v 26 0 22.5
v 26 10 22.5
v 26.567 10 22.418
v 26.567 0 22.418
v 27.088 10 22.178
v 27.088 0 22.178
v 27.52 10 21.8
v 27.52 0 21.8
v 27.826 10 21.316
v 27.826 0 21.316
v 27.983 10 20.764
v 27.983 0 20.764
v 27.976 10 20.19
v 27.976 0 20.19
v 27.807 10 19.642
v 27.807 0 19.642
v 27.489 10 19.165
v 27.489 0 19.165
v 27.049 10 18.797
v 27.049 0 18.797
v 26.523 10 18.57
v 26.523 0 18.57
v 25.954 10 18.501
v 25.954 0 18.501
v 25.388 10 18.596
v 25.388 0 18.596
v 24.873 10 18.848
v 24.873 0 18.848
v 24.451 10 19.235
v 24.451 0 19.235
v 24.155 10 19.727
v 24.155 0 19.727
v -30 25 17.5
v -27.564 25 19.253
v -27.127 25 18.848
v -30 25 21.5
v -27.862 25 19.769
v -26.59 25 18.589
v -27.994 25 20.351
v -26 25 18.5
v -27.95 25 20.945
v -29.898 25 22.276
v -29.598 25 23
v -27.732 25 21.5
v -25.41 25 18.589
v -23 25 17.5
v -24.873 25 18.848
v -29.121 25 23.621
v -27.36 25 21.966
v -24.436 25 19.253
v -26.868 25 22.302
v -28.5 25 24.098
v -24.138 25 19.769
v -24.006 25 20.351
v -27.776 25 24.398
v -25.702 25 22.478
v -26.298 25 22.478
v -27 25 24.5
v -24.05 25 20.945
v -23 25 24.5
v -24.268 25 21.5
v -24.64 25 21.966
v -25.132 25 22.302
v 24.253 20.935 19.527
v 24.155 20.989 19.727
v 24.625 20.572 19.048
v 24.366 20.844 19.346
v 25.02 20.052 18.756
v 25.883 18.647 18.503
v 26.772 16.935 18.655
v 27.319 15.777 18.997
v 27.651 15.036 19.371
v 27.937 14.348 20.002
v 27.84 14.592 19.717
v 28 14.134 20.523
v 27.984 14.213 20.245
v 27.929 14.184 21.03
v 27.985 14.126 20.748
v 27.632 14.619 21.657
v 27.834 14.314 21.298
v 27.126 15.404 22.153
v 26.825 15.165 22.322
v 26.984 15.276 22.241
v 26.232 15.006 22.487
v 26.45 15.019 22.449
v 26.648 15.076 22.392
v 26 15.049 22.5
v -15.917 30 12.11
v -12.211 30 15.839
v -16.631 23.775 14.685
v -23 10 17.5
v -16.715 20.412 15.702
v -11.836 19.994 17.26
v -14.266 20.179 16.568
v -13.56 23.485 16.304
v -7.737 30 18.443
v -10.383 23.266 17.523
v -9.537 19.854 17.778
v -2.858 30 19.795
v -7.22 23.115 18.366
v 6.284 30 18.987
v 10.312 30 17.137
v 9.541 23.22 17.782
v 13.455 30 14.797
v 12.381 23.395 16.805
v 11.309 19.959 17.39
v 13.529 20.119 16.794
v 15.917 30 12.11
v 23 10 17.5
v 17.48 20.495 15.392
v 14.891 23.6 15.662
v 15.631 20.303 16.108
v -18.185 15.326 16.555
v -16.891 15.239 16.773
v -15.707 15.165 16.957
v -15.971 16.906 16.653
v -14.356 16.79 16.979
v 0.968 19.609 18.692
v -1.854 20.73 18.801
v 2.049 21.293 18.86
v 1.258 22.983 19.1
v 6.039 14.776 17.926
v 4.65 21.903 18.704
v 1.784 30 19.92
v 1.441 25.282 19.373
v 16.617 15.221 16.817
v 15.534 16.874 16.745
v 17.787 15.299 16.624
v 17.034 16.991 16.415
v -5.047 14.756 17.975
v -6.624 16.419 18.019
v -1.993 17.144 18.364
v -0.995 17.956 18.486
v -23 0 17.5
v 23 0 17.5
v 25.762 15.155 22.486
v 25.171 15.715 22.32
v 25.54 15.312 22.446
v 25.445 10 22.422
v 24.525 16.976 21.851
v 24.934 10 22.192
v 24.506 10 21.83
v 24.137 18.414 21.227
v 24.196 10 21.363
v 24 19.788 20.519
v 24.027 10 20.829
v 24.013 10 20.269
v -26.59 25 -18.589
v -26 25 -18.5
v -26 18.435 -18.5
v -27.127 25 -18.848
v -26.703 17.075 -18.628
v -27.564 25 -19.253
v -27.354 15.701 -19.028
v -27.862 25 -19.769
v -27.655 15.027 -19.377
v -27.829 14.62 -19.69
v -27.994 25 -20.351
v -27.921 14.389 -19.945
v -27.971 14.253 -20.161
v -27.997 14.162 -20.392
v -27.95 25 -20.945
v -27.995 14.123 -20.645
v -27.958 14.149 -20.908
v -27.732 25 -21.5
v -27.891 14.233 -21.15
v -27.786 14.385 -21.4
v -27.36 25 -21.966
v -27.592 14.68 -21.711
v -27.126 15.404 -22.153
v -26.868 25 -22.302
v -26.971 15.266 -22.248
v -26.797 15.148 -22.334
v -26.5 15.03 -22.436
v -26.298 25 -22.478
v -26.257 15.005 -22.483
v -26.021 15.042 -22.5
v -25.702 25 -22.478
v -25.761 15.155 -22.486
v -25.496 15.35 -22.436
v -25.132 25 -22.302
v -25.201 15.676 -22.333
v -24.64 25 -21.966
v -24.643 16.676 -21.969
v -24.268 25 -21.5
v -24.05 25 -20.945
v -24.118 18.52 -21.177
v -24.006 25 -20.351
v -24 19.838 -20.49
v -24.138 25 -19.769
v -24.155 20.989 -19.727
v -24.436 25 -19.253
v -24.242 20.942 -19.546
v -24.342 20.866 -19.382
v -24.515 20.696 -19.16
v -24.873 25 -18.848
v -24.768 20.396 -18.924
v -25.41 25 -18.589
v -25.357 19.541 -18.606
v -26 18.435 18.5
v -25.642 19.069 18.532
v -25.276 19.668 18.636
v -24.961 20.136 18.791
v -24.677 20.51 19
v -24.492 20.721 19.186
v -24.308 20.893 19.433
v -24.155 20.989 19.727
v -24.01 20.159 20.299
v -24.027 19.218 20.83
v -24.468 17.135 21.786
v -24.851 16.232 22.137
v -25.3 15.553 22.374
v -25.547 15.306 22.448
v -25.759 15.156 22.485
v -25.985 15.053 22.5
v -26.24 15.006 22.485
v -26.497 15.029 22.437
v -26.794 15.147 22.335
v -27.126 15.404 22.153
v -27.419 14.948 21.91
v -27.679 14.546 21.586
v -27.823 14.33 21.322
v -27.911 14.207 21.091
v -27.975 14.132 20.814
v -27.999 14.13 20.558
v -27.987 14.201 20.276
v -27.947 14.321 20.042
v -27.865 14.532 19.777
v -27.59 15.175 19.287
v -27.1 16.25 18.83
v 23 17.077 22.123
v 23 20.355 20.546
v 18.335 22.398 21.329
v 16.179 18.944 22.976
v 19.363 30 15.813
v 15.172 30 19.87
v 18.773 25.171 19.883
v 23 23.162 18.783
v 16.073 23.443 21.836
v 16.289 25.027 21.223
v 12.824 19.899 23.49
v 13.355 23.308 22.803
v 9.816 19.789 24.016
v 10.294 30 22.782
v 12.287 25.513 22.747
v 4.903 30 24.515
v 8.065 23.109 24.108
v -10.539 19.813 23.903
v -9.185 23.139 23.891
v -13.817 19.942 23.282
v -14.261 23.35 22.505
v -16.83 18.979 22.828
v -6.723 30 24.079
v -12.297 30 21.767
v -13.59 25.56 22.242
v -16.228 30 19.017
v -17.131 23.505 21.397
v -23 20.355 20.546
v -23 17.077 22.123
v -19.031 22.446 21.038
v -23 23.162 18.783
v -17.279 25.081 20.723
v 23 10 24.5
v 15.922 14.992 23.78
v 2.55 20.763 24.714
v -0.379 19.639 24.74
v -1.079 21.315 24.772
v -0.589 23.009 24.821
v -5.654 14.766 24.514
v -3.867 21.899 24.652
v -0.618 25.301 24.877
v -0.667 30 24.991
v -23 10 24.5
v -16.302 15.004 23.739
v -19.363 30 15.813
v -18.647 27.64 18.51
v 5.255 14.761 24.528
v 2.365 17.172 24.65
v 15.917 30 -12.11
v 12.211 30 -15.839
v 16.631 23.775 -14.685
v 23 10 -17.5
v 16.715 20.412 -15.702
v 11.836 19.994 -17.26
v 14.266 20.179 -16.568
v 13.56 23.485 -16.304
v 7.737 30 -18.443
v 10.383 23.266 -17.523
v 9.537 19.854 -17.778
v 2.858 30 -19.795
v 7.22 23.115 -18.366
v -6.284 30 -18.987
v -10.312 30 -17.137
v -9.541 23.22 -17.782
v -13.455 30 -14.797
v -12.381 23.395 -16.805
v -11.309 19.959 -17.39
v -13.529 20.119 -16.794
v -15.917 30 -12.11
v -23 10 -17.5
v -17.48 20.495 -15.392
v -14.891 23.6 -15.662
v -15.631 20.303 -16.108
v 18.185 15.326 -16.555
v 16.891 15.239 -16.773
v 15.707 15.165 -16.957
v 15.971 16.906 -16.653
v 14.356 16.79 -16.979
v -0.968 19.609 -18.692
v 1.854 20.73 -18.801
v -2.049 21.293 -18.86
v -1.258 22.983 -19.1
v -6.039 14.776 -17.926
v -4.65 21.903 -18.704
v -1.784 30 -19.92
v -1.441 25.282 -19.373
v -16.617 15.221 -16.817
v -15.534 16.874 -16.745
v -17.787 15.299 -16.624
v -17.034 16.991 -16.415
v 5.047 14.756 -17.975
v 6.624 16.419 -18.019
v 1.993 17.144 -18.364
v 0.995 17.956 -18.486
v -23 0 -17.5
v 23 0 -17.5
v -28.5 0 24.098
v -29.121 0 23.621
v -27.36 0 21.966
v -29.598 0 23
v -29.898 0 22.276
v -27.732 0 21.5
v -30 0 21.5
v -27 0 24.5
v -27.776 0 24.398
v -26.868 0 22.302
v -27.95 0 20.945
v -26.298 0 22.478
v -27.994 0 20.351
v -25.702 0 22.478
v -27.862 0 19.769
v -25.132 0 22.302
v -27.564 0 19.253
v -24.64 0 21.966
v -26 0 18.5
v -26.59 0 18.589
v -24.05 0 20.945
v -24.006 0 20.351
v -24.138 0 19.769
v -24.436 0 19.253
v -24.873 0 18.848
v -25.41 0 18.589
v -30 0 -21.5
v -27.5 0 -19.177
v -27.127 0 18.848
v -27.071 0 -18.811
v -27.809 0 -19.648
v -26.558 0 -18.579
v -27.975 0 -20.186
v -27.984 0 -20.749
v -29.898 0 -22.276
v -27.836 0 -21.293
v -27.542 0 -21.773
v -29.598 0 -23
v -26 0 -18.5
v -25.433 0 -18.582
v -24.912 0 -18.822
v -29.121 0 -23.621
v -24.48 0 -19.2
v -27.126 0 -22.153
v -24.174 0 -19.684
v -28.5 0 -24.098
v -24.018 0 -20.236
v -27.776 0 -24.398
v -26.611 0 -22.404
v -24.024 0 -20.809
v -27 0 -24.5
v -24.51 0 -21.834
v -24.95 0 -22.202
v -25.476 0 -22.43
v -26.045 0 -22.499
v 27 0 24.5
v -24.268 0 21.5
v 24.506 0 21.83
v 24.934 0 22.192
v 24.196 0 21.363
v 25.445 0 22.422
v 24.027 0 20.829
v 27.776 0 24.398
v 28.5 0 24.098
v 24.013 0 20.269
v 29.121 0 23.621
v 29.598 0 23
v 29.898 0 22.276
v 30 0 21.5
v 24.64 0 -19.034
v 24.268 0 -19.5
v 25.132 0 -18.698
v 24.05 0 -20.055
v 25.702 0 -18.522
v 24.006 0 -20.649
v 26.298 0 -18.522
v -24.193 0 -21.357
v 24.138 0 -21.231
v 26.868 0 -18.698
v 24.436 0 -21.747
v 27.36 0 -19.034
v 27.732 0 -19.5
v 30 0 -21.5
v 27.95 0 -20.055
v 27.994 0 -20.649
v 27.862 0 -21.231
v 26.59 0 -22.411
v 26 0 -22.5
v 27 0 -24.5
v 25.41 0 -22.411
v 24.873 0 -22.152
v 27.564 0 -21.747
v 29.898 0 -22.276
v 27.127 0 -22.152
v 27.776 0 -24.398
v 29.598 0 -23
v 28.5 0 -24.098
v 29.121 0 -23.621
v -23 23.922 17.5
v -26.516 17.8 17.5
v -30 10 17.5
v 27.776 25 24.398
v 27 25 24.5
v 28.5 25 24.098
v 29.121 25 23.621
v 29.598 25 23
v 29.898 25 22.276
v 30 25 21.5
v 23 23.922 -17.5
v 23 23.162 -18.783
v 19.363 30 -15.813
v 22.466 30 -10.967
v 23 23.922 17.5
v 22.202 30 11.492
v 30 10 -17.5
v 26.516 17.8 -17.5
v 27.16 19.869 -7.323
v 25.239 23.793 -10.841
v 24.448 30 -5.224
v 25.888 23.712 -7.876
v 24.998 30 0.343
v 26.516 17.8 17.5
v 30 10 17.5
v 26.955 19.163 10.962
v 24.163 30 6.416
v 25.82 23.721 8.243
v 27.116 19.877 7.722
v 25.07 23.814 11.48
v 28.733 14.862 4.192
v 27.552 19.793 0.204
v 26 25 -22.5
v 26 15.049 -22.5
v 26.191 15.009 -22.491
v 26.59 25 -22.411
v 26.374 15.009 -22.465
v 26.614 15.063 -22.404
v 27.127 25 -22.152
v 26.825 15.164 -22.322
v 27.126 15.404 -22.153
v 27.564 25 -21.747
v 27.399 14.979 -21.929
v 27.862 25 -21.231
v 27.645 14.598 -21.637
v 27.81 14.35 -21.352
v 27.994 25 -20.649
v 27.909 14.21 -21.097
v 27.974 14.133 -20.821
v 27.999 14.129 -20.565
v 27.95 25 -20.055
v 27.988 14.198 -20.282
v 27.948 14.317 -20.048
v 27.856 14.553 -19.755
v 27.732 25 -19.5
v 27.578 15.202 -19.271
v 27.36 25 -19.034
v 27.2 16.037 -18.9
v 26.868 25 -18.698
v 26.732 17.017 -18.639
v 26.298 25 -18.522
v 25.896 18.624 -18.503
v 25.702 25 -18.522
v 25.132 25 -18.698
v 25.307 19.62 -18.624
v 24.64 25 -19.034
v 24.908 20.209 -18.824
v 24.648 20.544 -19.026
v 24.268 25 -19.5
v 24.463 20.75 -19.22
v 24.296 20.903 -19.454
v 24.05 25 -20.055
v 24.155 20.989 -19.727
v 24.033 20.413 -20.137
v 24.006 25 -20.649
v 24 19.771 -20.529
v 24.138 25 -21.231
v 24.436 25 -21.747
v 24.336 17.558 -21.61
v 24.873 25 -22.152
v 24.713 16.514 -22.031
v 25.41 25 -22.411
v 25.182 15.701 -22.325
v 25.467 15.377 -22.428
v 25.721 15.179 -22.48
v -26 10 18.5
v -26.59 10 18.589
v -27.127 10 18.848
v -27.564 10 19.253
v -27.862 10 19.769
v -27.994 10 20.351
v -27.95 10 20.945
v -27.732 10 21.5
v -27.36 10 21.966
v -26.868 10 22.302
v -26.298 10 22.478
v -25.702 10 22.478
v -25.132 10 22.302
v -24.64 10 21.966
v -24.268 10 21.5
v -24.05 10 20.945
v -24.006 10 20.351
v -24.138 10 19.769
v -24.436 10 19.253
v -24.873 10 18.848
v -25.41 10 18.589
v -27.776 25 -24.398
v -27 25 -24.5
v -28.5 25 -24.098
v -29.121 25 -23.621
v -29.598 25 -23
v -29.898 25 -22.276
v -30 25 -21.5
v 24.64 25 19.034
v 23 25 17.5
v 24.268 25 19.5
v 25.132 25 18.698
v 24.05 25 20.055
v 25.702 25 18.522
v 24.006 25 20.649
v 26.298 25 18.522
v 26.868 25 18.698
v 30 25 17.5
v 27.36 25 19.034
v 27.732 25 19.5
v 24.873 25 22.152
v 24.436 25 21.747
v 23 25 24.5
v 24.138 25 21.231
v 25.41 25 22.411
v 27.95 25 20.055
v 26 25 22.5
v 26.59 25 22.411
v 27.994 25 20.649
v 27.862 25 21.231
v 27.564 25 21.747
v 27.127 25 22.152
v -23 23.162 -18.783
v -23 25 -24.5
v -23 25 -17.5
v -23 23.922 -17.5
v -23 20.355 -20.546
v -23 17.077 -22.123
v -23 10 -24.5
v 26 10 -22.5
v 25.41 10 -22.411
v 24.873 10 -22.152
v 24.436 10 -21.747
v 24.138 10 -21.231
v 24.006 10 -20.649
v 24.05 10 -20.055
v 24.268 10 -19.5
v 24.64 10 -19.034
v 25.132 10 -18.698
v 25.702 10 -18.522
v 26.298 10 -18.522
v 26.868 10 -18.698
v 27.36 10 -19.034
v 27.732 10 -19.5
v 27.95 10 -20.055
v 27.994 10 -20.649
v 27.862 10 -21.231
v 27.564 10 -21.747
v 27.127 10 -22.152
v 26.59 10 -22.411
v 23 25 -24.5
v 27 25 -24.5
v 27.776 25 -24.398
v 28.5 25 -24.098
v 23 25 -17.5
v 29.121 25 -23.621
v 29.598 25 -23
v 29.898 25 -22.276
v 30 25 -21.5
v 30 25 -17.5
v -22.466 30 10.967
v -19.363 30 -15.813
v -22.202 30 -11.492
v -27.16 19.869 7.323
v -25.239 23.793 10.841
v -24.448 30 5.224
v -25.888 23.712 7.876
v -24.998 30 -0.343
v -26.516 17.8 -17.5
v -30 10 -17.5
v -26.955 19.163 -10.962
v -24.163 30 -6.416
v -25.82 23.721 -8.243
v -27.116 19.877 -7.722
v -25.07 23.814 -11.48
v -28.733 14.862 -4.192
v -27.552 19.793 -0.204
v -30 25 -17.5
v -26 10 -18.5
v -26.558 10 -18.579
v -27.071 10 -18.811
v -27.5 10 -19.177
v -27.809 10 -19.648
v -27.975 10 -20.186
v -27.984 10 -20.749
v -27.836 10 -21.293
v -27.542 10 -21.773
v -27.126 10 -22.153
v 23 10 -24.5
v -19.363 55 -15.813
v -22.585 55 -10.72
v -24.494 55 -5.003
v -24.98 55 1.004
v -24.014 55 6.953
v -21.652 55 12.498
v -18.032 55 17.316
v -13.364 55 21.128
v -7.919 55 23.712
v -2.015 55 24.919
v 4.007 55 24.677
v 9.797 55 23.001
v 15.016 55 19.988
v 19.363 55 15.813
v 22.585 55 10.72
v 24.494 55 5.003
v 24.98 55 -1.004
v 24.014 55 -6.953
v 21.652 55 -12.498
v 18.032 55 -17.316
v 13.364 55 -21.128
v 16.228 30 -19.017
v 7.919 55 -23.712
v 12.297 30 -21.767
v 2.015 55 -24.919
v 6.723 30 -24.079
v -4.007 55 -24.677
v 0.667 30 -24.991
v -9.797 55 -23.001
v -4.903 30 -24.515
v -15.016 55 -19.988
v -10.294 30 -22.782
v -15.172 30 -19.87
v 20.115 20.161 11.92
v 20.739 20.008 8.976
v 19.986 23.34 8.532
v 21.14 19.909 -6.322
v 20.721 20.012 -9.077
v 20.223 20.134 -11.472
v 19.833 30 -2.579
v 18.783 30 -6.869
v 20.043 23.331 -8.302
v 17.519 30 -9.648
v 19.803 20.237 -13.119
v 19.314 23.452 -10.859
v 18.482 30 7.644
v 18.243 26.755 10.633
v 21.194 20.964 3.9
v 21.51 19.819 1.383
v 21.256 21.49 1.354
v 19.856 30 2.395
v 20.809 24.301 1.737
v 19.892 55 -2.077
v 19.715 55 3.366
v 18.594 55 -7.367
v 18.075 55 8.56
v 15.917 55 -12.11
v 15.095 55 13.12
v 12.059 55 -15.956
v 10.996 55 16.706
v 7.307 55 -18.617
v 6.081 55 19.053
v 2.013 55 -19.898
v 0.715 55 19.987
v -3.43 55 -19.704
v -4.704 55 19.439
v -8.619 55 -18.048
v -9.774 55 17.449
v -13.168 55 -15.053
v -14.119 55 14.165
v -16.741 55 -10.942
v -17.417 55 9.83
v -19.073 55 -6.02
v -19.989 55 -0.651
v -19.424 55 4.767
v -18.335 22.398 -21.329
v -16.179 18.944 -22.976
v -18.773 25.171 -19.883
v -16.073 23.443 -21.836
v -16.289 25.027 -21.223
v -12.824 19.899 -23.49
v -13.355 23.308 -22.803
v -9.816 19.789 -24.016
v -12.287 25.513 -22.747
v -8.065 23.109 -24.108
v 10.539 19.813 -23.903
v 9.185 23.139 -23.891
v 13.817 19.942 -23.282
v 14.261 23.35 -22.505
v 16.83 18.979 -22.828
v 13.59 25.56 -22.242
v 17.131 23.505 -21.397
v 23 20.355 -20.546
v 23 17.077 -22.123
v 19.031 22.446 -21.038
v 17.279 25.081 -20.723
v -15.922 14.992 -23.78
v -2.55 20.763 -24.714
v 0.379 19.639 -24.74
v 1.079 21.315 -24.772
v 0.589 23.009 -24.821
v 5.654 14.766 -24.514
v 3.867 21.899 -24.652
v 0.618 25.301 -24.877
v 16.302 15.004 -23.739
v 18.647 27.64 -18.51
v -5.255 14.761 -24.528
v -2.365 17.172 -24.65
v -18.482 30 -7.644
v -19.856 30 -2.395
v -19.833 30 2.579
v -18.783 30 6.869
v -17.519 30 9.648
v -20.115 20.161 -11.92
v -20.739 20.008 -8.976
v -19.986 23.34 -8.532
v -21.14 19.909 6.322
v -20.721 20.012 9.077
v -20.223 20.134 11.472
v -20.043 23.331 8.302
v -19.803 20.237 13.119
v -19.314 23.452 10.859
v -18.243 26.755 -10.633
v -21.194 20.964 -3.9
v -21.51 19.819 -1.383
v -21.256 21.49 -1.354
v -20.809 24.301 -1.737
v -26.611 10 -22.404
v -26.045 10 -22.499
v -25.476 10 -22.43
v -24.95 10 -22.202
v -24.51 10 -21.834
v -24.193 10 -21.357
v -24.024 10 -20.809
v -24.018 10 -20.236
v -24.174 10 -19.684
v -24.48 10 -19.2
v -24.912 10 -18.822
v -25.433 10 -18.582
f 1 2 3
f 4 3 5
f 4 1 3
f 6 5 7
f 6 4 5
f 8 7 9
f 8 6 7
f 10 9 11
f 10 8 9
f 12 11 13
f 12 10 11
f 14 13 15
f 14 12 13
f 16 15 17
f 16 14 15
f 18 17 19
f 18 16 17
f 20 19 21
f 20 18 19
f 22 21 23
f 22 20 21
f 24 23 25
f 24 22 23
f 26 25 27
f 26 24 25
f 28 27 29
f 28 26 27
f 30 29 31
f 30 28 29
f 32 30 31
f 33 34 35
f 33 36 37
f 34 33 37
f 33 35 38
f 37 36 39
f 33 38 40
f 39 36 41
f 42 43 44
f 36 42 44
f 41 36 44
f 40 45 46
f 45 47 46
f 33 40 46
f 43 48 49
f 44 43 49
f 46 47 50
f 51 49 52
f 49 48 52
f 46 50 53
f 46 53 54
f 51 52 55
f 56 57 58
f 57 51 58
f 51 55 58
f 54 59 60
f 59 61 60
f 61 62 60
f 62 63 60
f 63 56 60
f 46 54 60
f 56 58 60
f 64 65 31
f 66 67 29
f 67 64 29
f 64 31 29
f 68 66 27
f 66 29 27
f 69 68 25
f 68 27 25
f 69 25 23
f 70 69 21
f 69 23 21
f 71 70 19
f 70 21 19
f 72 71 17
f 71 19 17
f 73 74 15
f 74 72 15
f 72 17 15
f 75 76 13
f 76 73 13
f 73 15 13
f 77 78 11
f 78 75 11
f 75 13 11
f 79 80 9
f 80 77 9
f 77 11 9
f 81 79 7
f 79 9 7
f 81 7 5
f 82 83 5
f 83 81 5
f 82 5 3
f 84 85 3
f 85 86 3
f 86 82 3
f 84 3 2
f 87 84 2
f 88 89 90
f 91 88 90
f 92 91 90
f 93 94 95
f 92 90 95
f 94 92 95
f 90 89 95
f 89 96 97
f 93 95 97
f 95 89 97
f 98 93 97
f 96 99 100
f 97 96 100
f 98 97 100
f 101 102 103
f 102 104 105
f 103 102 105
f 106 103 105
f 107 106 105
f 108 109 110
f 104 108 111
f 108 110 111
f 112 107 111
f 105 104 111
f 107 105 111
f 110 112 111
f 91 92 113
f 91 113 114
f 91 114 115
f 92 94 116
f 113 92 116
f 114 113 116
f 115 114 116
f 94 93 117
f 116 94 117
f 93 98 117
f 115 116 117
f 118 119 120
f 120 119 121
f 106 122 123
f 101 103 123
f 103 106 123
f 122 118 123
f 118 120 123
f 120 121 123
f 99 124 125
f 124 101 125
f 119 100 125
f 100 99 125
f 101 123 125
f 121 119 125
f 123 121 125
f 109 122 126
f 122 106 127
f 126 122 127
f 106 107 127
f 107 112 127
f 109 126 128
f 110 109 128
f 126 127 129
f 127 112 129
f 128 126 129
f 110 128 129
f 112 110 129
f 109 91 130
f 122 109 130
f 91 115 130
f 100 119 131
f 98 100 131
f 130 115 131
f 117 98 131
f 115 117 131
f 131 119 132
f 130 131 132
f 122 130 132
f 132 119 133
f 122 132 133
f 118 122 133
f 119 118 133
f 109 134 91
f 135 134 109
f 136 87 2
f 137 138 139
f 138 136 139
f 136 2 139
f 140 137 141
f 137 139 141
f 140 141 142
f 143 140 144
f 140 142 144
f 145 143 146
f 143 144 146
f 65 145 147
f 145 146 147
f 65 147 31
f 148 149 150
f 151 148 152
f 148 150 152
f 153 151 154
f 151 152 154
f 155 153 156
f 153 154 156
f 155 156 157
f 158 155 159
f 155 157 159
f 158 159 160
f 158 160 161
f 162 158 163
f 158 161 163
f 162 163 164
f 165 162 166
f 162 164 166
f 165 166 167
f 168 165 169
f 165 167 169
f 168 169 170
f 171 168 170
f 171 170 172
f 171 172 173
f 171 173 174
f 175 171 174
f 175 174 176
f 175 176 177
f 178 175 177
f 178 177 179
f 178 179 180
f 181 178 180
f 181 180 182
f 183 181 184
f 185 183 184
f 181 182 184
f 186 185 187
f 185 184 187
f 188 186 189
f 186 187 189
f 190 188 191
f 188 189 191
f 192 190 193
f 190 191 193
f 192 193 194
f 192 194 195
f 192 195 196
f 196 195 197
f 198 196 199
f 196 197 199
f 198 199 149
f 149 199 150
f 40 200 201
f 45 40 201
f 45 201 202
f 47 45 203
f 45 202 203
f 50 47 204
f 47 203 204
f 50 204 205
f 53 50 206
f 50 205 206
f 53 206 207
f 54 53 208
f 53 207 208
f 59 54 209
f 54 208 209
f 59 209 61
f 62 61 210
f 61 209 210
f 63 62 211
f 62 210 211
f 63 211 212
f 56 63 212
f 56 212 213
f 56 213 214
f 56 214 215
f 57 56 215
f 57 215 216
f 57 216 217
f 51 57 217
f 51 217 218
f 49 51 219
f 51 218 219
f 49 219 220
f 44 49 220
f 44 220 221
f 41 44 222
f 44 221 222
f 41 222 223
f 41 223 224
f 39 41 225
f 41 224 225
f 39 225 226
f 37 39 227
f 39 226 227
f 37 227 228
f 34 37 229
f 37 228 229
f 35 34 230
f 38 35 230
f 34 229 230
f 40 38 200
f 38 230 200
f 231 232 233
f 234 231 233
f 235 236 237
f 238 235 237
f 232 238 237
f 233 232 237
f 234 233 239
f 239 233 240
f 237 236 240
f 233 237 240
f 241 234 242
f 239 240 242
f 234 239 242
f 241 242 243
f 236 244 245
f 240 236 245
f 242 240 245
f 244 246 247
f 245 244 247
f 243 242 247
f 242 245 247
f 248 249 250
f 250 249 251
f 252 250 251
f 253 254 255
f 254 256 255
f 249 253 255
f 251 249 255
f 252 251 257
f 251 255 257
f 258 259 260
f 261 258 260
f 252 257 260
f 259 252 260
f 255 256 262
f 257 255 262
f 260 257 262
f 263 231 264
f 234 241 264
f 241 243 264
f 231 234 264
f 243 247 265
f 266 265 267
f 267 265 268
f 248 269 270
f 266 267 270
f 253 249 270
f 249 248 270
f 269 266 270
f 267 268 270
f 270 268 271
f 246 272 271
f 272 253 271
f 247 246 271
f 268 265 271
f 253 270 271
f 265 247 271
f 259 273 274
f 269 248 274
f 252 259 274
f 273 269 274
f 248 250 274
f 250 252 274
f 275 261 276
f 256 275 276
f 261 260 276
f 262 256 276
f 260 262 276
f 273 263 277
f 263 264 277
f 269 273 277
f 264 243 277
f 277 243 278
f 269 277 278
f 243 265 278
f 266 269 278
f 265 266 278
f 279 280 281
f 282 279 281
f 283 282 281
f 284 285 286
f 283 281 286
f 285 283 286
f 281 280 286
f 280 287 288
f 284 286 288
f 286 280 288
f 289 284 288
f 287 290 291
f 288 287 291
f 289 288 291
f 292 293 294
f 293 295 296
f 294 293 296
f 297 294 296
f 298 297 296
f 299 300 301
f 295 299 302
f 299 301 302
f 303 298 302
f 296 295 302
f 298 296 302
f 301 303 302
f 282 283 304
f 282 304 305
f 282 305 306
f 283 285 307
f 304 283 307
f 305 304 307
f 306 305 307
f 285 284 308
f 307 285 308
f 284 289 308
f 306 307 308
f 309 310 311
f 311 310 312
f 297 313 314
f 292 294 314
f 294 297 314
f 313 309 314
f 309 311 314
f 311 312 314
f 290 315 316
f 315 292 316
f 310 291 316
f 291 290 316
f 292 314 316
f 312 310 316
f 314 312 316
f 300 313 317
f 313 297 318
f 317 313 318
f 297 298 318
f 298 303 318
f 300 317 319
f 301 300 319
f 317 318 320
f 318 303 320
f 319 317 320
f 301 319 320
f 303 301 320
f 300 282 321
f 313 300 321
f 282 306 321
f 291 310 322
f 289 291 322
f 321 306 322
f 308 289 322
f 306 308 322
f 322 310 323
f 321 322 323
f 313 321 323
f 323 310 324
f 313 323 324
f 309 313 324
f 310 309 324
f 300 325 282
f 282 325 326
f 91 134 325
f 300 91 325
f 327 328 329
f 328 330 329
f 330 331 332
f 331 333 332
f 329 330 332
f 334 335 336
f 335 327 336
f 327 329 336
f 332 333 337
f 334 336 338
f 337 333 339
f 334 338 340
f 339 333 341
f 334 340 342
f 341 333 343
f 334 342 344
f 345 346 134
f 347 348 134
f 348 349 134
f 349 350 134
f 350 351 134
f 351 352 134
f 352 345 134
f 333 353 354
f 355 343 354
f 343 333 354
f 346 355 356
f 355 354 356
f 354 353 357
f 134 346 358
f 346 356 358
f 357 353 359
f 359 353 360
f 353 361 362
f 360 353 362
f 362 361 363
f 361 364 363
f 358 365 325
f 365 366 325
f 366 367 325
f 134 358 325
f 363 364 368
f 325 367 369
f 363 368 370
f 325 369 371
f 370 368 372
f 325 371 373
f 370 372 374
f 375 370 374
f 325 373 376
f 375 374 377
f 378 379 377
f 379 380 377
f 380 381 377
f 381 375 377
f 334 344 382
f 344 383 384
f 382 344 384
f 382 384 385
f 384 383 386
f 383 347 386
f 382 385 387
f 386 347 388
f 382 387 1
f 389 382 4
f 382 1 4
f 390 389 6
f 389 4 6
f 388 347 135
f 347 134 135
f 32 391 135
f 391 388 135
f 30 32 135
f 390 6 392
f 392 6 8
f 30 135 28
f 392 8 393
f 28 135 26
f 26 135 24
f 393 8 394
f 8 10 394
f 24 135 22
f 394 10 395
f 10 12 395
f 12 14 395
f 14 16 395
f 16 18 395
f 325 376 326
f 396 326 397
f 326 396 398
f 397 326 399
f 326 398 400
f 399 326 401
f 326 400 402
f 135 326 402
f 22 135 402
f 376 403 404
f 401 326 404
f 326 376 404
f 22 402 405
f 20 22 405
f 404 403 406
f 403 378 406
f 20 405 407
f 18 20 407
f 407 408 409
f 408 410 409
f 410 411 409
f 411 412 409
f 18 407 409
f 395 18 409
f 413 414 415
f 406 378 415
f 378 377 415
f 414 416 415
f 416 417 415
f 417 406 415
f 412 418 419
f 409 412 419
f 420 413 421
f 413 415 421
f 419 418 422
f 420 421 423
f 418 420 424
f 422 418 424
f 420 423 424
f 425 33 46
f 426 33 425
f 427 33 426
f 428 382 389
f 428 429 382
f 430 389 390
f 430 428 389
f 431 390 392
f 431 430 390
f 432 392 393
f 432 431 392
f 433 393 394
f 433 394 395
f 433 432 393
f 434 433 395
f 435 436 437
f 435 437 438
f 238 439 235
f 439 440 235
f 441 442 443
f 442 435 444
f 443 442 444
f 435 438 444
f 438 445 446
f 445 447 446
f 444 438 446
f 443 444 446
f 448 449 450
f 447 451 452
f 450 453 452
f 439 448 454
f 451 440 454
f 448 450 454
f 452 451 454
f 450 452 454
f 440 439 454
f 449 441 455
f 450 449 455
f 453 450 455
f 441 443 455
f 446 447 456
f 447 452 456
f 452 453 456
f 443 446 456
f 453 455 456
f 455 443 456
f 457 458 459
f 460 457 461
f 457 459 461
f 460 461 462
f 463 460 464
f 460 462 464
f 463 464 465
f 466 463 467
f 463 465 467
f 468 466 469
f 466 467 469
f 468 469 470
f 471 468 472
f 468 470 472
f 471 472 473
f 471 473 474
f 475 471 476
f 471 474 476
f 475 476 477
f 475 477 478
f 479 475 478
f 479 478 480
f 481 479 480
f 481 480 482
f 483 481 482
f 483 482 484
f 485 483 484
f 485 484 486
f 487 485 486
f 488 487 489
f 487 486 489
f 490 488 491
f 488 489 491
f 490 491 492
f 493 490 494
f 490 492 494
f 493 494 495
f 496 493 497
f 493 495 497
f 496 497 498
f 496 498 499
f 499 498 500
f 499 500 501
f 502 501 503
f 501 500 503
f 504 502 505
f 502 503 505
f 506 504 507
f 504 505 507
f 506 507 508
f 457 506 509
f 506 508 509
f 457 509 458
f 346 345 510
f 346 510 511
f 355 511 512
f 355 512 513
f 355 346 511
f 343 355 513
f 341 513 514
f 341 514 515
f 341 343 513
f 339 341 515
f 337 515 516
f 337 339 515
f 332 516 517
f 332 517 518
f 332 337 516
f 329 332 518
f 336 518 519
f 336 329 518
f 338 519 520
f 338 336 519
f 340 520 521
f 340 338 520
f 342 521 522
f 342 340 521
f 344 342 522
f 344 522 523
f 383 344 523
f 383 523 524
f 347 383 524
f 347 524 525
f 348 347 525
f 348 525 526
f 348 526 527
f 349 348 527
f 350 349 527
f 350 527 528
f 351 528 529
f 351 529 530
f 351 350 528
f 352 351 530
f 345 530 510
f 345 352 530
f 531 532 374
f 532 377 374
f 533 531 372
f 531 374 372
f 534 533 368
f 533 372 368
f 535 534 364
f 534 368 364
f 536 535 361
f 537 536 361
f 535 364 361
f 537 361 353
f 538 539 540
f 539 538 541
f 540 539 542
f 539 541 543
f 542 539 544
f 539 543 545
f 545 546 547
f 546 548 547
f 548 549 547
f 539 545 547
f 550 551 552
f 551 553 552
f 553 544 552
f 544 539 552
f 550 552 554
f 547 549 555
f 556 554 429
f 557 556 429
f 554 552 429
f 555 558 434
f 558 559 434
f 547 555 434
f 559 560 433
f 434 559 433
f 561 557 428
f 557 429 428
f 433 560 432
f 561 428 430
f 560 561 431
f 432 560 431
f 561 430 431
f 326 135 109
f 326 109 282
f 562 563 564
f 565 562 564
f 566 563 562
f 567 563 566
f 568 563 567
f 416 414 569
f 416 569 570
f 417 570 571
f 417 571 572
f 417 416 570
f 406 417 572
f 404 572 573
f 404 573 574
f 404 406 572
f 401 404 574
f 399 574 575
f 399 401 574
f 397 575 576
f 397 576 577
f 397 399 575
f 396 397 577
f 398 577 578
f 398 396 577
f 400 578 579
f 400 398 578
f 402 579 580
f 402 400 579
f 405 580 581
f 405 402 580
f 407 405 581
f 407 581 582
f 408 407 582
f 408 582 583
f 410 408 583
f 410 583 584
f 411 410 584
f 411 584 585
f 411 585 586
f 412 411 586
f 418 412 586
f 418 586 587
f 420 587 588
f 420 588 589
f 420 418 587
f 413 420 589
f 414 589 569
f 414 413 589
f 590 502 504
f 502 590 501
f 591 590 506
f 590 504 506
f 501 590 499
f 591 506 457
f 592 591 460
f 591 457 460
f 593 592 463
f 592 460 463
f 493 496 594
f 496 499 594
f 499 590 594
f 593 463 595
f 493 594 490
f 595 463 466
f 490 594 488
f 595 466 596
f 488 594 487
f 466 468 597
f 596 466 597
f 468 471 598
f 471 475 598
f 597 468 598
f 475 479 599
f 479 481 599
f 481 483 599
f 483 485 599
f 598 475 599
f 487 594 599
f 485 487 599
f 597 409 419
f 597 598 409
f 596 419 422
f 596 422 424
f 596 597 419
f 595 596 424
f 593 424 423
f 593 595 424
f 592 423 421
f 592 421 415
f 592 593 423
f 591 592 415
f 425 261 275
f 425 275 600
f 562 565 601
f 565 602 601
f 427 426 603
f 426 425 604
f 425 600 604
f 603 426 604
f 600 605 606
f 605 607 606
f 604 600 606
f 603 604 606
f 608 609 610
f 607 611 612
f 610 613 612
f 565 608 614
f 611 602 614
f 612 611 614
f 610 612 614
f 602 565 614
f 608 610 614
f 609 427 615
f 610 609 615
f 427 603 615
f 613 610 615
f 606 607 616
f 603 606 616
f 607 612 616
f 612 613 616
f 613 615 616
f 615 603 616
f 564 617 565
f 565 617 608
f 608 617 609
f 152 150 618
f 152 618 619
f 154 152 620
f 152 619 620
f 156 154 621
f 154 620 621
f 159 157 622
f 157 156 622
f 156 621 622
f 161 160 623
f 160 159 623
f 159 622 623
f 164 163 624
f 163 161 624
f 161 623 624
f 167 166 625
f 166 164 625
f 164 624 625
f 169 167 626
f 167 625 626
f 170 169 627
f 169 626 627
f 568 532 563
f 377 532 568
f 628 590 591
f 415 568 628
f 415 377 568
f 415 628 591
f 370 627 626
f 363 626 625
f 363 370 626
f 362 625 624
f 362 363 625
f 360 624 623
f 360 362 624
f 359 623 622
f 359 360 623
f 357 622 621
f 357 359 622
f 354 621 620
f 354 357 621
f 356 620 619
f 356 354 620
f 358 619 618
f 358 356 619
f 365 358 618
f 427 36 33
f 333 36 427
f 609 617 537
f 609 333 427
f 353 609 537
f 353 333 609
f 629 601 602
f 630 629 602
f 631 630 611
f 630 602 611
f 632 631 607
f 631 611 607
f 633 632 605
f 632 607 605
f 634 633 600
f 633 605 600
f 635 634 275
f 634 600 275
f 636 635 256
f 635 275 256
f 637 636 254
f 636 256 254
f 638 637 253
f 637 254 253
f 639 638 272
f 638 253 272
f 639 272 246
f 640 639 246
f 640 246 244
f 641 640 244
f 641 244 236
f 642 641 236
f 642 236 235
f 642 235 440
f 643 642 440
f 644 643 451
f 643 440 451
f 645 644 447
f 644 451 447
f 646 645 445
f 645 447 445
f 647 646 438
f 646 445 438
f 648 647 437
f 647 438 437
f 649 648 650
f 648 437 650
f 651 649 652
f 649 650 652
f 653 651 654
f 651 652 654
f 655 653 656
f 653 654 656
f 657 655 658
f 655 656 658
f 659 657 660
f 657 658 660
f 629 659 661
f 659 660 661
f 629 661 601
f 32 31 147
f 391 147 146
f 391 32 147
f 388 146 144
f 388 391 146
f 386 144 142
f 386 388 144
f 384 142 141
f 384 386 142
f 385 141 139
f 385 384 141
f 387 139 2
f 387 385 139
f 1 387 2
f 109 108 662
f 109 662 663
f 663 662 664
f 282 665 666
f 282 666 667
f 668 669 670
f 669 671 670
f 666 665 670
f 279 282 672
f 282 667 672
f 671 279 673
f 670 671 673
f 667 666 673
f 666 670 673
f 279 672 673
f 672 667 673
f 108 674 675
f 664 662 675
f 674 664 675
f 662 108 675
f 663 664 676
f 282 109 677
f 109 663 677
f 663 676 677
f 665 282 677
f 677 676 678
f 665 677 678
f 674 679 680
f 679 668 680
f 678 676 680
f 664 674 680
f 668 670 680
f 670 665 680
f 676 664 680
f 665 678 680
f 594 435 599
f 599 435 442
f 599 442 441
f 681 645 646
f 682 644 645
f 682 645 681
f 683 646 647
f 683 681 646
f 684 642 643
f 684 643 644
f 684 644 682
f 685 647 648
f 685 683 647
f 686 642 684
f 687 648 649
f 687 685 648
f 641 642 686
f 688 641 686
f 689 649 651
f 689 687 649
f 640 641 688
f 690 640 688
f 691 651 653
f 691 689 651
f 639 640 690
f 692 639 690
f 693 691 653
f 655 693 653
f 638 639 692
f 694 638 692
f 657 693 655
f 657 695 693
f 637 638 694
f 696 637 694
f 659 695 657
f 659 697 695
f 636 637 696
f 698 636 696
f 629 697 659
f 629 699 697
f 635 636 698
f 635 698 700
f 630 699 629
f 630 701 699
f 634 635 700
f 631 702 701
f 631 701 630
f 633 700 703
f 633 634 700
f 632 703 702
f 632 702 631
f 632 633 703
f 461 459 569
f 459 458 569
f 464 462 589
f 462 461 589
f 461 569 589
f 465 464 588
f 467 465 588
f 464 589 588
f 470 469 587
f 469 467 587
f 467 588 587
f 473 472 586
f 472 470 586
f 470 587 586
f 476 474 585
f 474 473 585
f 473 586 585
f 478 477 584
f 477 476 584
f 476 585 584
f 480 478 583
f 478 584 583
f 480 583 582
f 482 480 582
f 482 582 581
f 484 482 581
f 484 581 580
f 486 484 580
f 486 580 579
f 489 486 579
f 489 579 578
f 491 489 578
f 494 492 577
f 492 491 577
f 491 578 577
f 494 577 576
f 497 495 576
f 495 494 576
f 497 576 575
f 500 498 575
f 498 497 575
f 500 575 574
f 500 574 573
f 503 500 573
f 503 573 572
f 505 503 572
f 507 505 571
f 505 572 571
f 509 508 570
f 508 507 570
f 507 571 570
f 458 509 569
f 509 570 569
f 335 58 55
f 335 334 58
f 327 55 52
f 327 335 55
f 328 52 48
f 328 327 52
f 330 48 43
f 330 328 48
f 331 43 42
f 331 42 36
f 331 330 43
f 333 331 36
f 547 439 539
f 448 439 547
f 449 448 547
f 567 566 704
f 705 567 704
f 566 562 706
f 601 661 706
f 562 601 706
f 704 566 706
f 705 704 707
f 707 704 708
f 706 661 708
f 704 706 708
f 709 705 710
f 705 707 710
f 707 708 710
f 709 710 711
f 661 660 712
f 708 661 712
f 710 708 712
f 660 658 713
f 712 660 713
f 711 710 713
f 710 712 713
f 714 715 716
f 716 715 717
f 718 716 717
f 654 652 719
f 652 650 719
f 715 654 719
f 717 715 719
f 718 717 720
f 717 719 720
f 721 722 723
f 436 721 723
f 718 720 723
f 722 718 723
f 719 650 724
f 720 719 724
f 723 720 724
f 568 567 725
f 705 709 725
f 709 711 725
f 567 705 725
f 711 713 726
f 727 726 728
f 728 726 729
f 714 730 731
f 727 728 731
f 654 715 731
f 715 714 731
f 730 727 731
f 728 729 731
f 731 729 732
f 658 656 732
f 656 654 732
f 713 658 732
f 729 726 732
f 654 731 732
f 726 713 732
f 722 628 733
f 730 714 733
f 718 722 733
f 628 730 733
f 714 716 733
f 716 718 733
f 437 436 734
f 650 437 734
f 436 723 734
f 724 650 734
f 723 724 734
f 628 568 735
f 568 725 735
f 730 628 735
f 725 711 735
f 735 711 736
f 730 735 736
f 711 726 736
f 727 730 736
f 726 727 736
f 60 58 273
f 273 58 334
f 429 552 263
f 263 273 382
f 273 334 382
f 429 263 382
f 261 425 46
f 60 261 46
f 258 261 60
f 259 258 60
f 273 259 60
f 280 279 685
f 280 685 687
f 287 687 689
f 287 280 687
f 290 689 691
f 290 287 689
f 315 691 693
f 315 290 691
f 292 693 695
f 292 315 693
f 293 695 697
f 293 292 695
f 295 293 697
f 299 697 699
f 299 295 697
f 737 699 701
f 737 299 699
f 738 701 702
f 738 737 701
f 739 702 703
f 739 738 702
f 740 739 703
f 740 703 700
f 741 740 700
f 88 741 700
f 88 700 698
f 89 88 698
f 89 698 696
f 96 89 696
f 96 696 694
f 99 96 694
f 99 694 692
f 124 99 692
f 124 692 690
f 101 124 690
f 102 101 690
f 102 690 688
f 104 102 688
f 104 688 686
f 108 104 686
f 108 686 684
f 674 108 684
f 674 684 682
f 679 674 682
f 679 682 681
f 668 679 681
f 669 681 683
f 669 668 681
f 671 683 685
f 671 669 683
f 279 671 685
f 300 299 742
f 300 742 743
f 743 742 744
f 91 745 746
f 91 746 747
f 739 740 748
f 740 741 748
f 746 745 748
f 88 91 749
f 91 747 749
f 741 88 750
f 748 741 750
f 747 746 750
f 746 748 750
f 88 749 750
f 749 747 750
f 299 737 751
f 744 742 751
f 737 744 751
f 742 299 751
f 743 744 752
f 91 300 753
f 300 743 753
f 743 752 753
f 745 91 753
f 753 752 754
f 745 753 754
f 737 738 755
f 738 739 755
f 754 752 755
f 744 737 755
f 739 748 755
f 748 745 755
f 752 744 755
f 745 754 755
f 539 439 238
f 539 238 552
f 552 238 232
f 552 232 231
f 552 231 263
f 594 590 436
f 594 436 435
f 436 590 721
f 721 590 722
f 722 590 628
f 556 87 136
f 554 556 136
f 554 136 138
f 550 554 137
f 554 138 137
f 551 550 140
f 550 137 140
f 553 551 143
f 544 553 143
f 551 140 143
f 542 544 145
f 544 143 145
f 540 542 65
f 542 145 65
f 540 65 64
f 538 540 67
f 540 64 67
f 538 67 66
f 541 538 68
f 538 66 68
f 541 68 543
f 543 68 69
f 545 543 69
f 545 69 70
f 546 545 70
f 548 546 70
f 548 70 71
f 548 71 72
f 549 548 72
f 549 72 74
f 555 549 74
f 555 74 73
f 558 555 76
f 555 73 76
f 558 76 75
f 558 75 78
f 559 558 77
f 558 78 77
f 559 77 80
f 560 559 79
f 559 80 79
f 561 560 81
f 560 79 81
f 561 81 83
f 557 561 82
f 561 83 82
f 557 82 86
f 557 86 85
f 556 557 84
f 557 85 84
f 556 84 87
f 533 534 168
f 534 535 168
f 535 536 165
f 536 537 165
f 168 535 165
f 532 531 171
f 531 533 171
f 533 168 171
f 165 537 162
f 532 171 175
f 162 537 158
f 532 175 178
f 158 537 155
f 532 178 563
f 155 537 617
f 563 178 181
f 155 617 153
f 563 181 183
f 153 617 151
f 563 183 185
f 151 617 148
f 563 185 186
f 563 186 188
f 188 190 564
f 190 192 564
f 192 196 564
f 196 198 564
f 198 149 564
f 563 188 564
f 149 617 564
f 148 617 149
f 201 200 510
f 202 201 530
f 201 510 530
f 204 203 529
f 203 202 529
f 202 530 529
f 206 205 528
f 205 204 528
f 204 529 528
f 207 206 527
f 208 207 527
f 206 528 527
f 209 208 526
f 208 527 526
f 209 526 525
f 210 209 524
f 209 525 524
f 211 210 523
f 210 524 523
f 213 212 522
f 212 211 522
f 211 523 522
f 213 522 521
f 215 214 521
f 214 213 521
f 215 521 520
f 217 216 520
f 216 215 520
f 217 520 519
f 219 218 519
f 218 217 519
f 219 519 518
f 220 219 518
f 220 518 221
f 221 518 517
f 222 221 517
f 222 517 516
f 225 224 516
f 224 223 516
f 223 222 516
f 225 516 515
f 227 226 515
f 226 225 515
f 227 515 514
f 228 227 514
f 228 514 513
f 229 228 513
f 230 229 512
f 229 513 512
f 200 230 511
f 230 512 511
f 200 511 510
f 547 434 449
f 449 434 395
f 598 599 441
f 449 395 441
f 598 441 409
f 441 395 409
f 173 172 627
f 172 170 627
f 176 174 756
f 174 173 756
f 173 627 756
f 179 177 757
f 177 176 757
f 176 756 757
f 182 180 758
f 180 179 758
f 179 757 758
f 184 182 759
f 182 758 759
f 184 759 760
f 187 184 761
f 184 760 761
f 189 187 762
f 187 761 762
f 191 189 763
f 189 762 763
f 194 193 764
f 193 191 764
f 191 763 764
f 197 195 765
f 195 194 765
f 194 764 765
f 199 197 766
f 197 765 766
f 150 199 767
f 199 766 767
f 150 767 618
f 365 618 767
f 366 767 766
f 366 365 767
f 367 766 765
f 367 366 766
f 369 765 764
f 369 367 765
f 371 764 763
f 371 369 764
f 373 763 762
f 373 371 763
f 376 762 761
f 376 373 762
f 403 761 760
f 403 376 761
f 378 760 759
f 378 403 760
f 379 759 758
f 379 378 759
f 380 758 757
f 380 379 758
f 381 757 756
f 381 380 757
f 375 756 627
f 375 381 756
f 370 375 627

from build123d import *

# Parameters (mm, degrees)
SKETCH1_W           = 60
SKETCH1_H           = 49
SKETCH1_R           = 2
SKETCH1_W_2         = 46
SKETCH1_H_2         = 35
BOSS_EXTRUDE1_DEPTH = 10
SKETCH6_R           = 2
CUT_EXTRUDE3_DEPTH  = 50.244289182
SKETCH7_W           = 7
SKETCH7_H           = 7
SKETCH7_R           = 2
BOSS_EXTRUDE4_DEPTH = 25
SKETCH10_R          = 25
SKETCH10_R_2        = 20
BOSS_EXTRUDE5_DEPTH = 25
FILLET2_R           = 3


with BuildPart() as part:
    # Sketch1 → Boss-Extrude1 (new body)
    with BuildSketch(Plane(origin=(0, 0, 0), x_dir=(1, 0, 0), z_dir=(0, 1, 0))):
        Rectangle(SKETCH1_W, SKETCH1_H)
        with Locations((-26, 20.5)):
            Circle(SKETCH1_R, mode=Mode.SUBTRACT)
        with Locations((26, 20.5)):
            Circle(SKETCH1_R, mode=Mode.SUBTRACT)
        with Locations((26, -20.5)):
            Circle(SKETCH1_R, mode=Mode.SUBTRACT)
        with Locations((-26, -20.5)):
            Circle(SKETCH1_R, mode=Mode.SUBTRACT)
        Rectangle(SKETCH1_W_2, SKETCH1_H_2, mode=Mode.SUBTRACT)
    extrude(amount=BOSS_EXTRUDE1_DEPTH)

    # Sketch9 → Loft1 section 0
    with BuildSketch(Plane(origin=(0, 10, 0), x_dir=(1, 0, 0), z_dir=(0, 1, 0))):
        with BuildLine():
            Line((30, -24.5), (-30, -24.5))
            Line((-30, -24.5), (-30, 24.5))
            Line((-30, 24.5), (30, 24.5))
            Line((30, 24.5), (30, -24.5))
        make_face()
    # Sketch8 for Loft1 → Loft1 section 1
    with BuildSketch(Plane(origin=(0, 30, 0), x_dir=(1, 0, 0), z_dir=(0, 1, 0))):
        with BuildLine():
            # circular arc as an exact rational Bezier (weights 1, cos(half-angle), 1)
            Bezier((19.36330319, -15.813364272), (0, -39.523531441), (-19.36330319, -15.813364272), weights=[1, 0.632534571, 1])
            Bezier((-19.36330319, -15.813364272), (-32.277550677, 0), (-19.36330319, 15.813364272), weights=[1, 0.774532128, 1])
            Bezier((-19.36330319, 15.813364272), (0, 39.523531441), (19.36330319, 15.813364272), weights=[1, 0.632534571, 1])
            Bezier((19.36330319, 15.813364272), (32.277550677, 0), (19.36330319, -15.813364272), weights=[1, 0.774532128, 1])
        make_face()
    loft()

    # Sketch2 → Cut-Loft1 section 0
    with BuildSketch(Plane(origin=(0, 10, 0), x_dir=(1, 0, 0), z_dir=(0, 1, 0))):
        with BuildLine():
            Line((-23, -17.5), (23, -17.5))
            Line((23, -17.5), (23, 17.5))
            Line((23, 17.5), (-23, 17.5))
            Line((-23, 17.5), (-23, -17.5))
        make_face()
    # Sketch3 for Cut-Loft1 → Cut-Loft1 section 1
    with BuildSketch(Plane(origin=(0, 30, 0), x_dir=(1, 0, 0), z_dir=(0, 1, 0))):
        with BuildLine():
            Bezier((-15.916573882, -12.11043665), (0, -33.029362323), (15.916573882, -12.11043665), weights=[1, 0.605521832, 1])
            Bezier((15.916573882, -12.11043665), (25.131036551, 0), (15.916573882, 12.11043665), weights=[1, 0.795828694, 1])
            Bezier((15.916573882, 12.11043665), (0, 33.029362323), (-15.916573882, 12.11043665), weights=[1, 0.605521832, 1])
            Bezier((-15.916573882, 12.11043665), (-25.131036551, 0), (-15.916573882, -12.11043665), weights=[1, 0.795828694, 1])
        make_face()
    loft(mode=Mode.SUBTRACT)

    # Sketch6 → Cut-Extrude3 (cut, through all)
    with BuildSketch(Plane.XZ):
        with Locations((26, 20.5)):
            Circle(SKETCH6_R)
        with Locations((26, -20.5)):
            Circle(SKETCH6_R)
        with Locations((-26, -20.5)):
            Circle(SKETCH6_R)
        with Locations((-26, 20.5)):
            Circle(SKETCH6_R)
    extrude(amount=-CUT_EXTRUDE3_DEPTH, mode=Mode.SUBTRACT)

    # Sketch7 → Boss-Extrude4 (add)
    # profile 1 of 4: a face of its own
    with BuildSketch(Plane.XZ):
        with Locations((-26.5, 21)):
            Rectangle(SKETCH7_W, SKETCH7_H)
        with Locations((-26, 20.5)):
            Circle(SKETCH7_R, mode=Mode.SUBTRACT)
    # profile 2 of 4: a face of its own
    with BuildSketch(Plane.XZ):
        with Locations((-26.5, -21)):
            Rectangle(SKETCH7_W, SKETCH7_H)
        with Locations((-26, -20.5)):
            Circle(SKETCH7_R, mode=Mode.SUBTRACT)
    # profile 3 of 4: a face of its own
    with BuildSketch(Plane.XZ):
        with Locations((26.5, -21)):
            Rectangle(SKETCH7_W, SKETCH7_H)
        with Locations((26, -20.5)):
            Circle(SKETCH7_R, mode=Mode.SUBTRACT)
    # profile 4 of 4: a face of its own
    with BuildSketch(Plane.XZ):
        with Locations((26.5, 21)):
            Rectangle(SKETCH7_W, SKETCH7_H)
        with Locations((26, 20.5)):
            Circle(SKETCH7_R, mode=Mode.SUBTRACT)
    extrude(amount=-BOSS_EXTRUDE4_DEPTH)

    # Sketch10 → Boss-Extrude5 (add)
    with BuildSketch(Plane(origin=(0, 30, 0), x_dir=(1, 0, 0), z_dir=(0, 1, 0))):
        Circle(SKETCH10_R)
        Circle(SKETCH10_R_2, mode=Mode.SUBTRACT)
    extrude(amount=BOSS_EXTRUDE5_DEPTH)

    # Fillet2
    fillet2_edges = [part.edges().sort_by_distance(p)[0] for p in [
        (-30, 12.5, 24.5),
        (-30, 12.5, -24.5),
        (30, 12.5, -24.5),
        (30, 12.5, 24.5),
    ]]
    fillet(fillet2_edges, radius=FILLET2_R)


solid = part.part
